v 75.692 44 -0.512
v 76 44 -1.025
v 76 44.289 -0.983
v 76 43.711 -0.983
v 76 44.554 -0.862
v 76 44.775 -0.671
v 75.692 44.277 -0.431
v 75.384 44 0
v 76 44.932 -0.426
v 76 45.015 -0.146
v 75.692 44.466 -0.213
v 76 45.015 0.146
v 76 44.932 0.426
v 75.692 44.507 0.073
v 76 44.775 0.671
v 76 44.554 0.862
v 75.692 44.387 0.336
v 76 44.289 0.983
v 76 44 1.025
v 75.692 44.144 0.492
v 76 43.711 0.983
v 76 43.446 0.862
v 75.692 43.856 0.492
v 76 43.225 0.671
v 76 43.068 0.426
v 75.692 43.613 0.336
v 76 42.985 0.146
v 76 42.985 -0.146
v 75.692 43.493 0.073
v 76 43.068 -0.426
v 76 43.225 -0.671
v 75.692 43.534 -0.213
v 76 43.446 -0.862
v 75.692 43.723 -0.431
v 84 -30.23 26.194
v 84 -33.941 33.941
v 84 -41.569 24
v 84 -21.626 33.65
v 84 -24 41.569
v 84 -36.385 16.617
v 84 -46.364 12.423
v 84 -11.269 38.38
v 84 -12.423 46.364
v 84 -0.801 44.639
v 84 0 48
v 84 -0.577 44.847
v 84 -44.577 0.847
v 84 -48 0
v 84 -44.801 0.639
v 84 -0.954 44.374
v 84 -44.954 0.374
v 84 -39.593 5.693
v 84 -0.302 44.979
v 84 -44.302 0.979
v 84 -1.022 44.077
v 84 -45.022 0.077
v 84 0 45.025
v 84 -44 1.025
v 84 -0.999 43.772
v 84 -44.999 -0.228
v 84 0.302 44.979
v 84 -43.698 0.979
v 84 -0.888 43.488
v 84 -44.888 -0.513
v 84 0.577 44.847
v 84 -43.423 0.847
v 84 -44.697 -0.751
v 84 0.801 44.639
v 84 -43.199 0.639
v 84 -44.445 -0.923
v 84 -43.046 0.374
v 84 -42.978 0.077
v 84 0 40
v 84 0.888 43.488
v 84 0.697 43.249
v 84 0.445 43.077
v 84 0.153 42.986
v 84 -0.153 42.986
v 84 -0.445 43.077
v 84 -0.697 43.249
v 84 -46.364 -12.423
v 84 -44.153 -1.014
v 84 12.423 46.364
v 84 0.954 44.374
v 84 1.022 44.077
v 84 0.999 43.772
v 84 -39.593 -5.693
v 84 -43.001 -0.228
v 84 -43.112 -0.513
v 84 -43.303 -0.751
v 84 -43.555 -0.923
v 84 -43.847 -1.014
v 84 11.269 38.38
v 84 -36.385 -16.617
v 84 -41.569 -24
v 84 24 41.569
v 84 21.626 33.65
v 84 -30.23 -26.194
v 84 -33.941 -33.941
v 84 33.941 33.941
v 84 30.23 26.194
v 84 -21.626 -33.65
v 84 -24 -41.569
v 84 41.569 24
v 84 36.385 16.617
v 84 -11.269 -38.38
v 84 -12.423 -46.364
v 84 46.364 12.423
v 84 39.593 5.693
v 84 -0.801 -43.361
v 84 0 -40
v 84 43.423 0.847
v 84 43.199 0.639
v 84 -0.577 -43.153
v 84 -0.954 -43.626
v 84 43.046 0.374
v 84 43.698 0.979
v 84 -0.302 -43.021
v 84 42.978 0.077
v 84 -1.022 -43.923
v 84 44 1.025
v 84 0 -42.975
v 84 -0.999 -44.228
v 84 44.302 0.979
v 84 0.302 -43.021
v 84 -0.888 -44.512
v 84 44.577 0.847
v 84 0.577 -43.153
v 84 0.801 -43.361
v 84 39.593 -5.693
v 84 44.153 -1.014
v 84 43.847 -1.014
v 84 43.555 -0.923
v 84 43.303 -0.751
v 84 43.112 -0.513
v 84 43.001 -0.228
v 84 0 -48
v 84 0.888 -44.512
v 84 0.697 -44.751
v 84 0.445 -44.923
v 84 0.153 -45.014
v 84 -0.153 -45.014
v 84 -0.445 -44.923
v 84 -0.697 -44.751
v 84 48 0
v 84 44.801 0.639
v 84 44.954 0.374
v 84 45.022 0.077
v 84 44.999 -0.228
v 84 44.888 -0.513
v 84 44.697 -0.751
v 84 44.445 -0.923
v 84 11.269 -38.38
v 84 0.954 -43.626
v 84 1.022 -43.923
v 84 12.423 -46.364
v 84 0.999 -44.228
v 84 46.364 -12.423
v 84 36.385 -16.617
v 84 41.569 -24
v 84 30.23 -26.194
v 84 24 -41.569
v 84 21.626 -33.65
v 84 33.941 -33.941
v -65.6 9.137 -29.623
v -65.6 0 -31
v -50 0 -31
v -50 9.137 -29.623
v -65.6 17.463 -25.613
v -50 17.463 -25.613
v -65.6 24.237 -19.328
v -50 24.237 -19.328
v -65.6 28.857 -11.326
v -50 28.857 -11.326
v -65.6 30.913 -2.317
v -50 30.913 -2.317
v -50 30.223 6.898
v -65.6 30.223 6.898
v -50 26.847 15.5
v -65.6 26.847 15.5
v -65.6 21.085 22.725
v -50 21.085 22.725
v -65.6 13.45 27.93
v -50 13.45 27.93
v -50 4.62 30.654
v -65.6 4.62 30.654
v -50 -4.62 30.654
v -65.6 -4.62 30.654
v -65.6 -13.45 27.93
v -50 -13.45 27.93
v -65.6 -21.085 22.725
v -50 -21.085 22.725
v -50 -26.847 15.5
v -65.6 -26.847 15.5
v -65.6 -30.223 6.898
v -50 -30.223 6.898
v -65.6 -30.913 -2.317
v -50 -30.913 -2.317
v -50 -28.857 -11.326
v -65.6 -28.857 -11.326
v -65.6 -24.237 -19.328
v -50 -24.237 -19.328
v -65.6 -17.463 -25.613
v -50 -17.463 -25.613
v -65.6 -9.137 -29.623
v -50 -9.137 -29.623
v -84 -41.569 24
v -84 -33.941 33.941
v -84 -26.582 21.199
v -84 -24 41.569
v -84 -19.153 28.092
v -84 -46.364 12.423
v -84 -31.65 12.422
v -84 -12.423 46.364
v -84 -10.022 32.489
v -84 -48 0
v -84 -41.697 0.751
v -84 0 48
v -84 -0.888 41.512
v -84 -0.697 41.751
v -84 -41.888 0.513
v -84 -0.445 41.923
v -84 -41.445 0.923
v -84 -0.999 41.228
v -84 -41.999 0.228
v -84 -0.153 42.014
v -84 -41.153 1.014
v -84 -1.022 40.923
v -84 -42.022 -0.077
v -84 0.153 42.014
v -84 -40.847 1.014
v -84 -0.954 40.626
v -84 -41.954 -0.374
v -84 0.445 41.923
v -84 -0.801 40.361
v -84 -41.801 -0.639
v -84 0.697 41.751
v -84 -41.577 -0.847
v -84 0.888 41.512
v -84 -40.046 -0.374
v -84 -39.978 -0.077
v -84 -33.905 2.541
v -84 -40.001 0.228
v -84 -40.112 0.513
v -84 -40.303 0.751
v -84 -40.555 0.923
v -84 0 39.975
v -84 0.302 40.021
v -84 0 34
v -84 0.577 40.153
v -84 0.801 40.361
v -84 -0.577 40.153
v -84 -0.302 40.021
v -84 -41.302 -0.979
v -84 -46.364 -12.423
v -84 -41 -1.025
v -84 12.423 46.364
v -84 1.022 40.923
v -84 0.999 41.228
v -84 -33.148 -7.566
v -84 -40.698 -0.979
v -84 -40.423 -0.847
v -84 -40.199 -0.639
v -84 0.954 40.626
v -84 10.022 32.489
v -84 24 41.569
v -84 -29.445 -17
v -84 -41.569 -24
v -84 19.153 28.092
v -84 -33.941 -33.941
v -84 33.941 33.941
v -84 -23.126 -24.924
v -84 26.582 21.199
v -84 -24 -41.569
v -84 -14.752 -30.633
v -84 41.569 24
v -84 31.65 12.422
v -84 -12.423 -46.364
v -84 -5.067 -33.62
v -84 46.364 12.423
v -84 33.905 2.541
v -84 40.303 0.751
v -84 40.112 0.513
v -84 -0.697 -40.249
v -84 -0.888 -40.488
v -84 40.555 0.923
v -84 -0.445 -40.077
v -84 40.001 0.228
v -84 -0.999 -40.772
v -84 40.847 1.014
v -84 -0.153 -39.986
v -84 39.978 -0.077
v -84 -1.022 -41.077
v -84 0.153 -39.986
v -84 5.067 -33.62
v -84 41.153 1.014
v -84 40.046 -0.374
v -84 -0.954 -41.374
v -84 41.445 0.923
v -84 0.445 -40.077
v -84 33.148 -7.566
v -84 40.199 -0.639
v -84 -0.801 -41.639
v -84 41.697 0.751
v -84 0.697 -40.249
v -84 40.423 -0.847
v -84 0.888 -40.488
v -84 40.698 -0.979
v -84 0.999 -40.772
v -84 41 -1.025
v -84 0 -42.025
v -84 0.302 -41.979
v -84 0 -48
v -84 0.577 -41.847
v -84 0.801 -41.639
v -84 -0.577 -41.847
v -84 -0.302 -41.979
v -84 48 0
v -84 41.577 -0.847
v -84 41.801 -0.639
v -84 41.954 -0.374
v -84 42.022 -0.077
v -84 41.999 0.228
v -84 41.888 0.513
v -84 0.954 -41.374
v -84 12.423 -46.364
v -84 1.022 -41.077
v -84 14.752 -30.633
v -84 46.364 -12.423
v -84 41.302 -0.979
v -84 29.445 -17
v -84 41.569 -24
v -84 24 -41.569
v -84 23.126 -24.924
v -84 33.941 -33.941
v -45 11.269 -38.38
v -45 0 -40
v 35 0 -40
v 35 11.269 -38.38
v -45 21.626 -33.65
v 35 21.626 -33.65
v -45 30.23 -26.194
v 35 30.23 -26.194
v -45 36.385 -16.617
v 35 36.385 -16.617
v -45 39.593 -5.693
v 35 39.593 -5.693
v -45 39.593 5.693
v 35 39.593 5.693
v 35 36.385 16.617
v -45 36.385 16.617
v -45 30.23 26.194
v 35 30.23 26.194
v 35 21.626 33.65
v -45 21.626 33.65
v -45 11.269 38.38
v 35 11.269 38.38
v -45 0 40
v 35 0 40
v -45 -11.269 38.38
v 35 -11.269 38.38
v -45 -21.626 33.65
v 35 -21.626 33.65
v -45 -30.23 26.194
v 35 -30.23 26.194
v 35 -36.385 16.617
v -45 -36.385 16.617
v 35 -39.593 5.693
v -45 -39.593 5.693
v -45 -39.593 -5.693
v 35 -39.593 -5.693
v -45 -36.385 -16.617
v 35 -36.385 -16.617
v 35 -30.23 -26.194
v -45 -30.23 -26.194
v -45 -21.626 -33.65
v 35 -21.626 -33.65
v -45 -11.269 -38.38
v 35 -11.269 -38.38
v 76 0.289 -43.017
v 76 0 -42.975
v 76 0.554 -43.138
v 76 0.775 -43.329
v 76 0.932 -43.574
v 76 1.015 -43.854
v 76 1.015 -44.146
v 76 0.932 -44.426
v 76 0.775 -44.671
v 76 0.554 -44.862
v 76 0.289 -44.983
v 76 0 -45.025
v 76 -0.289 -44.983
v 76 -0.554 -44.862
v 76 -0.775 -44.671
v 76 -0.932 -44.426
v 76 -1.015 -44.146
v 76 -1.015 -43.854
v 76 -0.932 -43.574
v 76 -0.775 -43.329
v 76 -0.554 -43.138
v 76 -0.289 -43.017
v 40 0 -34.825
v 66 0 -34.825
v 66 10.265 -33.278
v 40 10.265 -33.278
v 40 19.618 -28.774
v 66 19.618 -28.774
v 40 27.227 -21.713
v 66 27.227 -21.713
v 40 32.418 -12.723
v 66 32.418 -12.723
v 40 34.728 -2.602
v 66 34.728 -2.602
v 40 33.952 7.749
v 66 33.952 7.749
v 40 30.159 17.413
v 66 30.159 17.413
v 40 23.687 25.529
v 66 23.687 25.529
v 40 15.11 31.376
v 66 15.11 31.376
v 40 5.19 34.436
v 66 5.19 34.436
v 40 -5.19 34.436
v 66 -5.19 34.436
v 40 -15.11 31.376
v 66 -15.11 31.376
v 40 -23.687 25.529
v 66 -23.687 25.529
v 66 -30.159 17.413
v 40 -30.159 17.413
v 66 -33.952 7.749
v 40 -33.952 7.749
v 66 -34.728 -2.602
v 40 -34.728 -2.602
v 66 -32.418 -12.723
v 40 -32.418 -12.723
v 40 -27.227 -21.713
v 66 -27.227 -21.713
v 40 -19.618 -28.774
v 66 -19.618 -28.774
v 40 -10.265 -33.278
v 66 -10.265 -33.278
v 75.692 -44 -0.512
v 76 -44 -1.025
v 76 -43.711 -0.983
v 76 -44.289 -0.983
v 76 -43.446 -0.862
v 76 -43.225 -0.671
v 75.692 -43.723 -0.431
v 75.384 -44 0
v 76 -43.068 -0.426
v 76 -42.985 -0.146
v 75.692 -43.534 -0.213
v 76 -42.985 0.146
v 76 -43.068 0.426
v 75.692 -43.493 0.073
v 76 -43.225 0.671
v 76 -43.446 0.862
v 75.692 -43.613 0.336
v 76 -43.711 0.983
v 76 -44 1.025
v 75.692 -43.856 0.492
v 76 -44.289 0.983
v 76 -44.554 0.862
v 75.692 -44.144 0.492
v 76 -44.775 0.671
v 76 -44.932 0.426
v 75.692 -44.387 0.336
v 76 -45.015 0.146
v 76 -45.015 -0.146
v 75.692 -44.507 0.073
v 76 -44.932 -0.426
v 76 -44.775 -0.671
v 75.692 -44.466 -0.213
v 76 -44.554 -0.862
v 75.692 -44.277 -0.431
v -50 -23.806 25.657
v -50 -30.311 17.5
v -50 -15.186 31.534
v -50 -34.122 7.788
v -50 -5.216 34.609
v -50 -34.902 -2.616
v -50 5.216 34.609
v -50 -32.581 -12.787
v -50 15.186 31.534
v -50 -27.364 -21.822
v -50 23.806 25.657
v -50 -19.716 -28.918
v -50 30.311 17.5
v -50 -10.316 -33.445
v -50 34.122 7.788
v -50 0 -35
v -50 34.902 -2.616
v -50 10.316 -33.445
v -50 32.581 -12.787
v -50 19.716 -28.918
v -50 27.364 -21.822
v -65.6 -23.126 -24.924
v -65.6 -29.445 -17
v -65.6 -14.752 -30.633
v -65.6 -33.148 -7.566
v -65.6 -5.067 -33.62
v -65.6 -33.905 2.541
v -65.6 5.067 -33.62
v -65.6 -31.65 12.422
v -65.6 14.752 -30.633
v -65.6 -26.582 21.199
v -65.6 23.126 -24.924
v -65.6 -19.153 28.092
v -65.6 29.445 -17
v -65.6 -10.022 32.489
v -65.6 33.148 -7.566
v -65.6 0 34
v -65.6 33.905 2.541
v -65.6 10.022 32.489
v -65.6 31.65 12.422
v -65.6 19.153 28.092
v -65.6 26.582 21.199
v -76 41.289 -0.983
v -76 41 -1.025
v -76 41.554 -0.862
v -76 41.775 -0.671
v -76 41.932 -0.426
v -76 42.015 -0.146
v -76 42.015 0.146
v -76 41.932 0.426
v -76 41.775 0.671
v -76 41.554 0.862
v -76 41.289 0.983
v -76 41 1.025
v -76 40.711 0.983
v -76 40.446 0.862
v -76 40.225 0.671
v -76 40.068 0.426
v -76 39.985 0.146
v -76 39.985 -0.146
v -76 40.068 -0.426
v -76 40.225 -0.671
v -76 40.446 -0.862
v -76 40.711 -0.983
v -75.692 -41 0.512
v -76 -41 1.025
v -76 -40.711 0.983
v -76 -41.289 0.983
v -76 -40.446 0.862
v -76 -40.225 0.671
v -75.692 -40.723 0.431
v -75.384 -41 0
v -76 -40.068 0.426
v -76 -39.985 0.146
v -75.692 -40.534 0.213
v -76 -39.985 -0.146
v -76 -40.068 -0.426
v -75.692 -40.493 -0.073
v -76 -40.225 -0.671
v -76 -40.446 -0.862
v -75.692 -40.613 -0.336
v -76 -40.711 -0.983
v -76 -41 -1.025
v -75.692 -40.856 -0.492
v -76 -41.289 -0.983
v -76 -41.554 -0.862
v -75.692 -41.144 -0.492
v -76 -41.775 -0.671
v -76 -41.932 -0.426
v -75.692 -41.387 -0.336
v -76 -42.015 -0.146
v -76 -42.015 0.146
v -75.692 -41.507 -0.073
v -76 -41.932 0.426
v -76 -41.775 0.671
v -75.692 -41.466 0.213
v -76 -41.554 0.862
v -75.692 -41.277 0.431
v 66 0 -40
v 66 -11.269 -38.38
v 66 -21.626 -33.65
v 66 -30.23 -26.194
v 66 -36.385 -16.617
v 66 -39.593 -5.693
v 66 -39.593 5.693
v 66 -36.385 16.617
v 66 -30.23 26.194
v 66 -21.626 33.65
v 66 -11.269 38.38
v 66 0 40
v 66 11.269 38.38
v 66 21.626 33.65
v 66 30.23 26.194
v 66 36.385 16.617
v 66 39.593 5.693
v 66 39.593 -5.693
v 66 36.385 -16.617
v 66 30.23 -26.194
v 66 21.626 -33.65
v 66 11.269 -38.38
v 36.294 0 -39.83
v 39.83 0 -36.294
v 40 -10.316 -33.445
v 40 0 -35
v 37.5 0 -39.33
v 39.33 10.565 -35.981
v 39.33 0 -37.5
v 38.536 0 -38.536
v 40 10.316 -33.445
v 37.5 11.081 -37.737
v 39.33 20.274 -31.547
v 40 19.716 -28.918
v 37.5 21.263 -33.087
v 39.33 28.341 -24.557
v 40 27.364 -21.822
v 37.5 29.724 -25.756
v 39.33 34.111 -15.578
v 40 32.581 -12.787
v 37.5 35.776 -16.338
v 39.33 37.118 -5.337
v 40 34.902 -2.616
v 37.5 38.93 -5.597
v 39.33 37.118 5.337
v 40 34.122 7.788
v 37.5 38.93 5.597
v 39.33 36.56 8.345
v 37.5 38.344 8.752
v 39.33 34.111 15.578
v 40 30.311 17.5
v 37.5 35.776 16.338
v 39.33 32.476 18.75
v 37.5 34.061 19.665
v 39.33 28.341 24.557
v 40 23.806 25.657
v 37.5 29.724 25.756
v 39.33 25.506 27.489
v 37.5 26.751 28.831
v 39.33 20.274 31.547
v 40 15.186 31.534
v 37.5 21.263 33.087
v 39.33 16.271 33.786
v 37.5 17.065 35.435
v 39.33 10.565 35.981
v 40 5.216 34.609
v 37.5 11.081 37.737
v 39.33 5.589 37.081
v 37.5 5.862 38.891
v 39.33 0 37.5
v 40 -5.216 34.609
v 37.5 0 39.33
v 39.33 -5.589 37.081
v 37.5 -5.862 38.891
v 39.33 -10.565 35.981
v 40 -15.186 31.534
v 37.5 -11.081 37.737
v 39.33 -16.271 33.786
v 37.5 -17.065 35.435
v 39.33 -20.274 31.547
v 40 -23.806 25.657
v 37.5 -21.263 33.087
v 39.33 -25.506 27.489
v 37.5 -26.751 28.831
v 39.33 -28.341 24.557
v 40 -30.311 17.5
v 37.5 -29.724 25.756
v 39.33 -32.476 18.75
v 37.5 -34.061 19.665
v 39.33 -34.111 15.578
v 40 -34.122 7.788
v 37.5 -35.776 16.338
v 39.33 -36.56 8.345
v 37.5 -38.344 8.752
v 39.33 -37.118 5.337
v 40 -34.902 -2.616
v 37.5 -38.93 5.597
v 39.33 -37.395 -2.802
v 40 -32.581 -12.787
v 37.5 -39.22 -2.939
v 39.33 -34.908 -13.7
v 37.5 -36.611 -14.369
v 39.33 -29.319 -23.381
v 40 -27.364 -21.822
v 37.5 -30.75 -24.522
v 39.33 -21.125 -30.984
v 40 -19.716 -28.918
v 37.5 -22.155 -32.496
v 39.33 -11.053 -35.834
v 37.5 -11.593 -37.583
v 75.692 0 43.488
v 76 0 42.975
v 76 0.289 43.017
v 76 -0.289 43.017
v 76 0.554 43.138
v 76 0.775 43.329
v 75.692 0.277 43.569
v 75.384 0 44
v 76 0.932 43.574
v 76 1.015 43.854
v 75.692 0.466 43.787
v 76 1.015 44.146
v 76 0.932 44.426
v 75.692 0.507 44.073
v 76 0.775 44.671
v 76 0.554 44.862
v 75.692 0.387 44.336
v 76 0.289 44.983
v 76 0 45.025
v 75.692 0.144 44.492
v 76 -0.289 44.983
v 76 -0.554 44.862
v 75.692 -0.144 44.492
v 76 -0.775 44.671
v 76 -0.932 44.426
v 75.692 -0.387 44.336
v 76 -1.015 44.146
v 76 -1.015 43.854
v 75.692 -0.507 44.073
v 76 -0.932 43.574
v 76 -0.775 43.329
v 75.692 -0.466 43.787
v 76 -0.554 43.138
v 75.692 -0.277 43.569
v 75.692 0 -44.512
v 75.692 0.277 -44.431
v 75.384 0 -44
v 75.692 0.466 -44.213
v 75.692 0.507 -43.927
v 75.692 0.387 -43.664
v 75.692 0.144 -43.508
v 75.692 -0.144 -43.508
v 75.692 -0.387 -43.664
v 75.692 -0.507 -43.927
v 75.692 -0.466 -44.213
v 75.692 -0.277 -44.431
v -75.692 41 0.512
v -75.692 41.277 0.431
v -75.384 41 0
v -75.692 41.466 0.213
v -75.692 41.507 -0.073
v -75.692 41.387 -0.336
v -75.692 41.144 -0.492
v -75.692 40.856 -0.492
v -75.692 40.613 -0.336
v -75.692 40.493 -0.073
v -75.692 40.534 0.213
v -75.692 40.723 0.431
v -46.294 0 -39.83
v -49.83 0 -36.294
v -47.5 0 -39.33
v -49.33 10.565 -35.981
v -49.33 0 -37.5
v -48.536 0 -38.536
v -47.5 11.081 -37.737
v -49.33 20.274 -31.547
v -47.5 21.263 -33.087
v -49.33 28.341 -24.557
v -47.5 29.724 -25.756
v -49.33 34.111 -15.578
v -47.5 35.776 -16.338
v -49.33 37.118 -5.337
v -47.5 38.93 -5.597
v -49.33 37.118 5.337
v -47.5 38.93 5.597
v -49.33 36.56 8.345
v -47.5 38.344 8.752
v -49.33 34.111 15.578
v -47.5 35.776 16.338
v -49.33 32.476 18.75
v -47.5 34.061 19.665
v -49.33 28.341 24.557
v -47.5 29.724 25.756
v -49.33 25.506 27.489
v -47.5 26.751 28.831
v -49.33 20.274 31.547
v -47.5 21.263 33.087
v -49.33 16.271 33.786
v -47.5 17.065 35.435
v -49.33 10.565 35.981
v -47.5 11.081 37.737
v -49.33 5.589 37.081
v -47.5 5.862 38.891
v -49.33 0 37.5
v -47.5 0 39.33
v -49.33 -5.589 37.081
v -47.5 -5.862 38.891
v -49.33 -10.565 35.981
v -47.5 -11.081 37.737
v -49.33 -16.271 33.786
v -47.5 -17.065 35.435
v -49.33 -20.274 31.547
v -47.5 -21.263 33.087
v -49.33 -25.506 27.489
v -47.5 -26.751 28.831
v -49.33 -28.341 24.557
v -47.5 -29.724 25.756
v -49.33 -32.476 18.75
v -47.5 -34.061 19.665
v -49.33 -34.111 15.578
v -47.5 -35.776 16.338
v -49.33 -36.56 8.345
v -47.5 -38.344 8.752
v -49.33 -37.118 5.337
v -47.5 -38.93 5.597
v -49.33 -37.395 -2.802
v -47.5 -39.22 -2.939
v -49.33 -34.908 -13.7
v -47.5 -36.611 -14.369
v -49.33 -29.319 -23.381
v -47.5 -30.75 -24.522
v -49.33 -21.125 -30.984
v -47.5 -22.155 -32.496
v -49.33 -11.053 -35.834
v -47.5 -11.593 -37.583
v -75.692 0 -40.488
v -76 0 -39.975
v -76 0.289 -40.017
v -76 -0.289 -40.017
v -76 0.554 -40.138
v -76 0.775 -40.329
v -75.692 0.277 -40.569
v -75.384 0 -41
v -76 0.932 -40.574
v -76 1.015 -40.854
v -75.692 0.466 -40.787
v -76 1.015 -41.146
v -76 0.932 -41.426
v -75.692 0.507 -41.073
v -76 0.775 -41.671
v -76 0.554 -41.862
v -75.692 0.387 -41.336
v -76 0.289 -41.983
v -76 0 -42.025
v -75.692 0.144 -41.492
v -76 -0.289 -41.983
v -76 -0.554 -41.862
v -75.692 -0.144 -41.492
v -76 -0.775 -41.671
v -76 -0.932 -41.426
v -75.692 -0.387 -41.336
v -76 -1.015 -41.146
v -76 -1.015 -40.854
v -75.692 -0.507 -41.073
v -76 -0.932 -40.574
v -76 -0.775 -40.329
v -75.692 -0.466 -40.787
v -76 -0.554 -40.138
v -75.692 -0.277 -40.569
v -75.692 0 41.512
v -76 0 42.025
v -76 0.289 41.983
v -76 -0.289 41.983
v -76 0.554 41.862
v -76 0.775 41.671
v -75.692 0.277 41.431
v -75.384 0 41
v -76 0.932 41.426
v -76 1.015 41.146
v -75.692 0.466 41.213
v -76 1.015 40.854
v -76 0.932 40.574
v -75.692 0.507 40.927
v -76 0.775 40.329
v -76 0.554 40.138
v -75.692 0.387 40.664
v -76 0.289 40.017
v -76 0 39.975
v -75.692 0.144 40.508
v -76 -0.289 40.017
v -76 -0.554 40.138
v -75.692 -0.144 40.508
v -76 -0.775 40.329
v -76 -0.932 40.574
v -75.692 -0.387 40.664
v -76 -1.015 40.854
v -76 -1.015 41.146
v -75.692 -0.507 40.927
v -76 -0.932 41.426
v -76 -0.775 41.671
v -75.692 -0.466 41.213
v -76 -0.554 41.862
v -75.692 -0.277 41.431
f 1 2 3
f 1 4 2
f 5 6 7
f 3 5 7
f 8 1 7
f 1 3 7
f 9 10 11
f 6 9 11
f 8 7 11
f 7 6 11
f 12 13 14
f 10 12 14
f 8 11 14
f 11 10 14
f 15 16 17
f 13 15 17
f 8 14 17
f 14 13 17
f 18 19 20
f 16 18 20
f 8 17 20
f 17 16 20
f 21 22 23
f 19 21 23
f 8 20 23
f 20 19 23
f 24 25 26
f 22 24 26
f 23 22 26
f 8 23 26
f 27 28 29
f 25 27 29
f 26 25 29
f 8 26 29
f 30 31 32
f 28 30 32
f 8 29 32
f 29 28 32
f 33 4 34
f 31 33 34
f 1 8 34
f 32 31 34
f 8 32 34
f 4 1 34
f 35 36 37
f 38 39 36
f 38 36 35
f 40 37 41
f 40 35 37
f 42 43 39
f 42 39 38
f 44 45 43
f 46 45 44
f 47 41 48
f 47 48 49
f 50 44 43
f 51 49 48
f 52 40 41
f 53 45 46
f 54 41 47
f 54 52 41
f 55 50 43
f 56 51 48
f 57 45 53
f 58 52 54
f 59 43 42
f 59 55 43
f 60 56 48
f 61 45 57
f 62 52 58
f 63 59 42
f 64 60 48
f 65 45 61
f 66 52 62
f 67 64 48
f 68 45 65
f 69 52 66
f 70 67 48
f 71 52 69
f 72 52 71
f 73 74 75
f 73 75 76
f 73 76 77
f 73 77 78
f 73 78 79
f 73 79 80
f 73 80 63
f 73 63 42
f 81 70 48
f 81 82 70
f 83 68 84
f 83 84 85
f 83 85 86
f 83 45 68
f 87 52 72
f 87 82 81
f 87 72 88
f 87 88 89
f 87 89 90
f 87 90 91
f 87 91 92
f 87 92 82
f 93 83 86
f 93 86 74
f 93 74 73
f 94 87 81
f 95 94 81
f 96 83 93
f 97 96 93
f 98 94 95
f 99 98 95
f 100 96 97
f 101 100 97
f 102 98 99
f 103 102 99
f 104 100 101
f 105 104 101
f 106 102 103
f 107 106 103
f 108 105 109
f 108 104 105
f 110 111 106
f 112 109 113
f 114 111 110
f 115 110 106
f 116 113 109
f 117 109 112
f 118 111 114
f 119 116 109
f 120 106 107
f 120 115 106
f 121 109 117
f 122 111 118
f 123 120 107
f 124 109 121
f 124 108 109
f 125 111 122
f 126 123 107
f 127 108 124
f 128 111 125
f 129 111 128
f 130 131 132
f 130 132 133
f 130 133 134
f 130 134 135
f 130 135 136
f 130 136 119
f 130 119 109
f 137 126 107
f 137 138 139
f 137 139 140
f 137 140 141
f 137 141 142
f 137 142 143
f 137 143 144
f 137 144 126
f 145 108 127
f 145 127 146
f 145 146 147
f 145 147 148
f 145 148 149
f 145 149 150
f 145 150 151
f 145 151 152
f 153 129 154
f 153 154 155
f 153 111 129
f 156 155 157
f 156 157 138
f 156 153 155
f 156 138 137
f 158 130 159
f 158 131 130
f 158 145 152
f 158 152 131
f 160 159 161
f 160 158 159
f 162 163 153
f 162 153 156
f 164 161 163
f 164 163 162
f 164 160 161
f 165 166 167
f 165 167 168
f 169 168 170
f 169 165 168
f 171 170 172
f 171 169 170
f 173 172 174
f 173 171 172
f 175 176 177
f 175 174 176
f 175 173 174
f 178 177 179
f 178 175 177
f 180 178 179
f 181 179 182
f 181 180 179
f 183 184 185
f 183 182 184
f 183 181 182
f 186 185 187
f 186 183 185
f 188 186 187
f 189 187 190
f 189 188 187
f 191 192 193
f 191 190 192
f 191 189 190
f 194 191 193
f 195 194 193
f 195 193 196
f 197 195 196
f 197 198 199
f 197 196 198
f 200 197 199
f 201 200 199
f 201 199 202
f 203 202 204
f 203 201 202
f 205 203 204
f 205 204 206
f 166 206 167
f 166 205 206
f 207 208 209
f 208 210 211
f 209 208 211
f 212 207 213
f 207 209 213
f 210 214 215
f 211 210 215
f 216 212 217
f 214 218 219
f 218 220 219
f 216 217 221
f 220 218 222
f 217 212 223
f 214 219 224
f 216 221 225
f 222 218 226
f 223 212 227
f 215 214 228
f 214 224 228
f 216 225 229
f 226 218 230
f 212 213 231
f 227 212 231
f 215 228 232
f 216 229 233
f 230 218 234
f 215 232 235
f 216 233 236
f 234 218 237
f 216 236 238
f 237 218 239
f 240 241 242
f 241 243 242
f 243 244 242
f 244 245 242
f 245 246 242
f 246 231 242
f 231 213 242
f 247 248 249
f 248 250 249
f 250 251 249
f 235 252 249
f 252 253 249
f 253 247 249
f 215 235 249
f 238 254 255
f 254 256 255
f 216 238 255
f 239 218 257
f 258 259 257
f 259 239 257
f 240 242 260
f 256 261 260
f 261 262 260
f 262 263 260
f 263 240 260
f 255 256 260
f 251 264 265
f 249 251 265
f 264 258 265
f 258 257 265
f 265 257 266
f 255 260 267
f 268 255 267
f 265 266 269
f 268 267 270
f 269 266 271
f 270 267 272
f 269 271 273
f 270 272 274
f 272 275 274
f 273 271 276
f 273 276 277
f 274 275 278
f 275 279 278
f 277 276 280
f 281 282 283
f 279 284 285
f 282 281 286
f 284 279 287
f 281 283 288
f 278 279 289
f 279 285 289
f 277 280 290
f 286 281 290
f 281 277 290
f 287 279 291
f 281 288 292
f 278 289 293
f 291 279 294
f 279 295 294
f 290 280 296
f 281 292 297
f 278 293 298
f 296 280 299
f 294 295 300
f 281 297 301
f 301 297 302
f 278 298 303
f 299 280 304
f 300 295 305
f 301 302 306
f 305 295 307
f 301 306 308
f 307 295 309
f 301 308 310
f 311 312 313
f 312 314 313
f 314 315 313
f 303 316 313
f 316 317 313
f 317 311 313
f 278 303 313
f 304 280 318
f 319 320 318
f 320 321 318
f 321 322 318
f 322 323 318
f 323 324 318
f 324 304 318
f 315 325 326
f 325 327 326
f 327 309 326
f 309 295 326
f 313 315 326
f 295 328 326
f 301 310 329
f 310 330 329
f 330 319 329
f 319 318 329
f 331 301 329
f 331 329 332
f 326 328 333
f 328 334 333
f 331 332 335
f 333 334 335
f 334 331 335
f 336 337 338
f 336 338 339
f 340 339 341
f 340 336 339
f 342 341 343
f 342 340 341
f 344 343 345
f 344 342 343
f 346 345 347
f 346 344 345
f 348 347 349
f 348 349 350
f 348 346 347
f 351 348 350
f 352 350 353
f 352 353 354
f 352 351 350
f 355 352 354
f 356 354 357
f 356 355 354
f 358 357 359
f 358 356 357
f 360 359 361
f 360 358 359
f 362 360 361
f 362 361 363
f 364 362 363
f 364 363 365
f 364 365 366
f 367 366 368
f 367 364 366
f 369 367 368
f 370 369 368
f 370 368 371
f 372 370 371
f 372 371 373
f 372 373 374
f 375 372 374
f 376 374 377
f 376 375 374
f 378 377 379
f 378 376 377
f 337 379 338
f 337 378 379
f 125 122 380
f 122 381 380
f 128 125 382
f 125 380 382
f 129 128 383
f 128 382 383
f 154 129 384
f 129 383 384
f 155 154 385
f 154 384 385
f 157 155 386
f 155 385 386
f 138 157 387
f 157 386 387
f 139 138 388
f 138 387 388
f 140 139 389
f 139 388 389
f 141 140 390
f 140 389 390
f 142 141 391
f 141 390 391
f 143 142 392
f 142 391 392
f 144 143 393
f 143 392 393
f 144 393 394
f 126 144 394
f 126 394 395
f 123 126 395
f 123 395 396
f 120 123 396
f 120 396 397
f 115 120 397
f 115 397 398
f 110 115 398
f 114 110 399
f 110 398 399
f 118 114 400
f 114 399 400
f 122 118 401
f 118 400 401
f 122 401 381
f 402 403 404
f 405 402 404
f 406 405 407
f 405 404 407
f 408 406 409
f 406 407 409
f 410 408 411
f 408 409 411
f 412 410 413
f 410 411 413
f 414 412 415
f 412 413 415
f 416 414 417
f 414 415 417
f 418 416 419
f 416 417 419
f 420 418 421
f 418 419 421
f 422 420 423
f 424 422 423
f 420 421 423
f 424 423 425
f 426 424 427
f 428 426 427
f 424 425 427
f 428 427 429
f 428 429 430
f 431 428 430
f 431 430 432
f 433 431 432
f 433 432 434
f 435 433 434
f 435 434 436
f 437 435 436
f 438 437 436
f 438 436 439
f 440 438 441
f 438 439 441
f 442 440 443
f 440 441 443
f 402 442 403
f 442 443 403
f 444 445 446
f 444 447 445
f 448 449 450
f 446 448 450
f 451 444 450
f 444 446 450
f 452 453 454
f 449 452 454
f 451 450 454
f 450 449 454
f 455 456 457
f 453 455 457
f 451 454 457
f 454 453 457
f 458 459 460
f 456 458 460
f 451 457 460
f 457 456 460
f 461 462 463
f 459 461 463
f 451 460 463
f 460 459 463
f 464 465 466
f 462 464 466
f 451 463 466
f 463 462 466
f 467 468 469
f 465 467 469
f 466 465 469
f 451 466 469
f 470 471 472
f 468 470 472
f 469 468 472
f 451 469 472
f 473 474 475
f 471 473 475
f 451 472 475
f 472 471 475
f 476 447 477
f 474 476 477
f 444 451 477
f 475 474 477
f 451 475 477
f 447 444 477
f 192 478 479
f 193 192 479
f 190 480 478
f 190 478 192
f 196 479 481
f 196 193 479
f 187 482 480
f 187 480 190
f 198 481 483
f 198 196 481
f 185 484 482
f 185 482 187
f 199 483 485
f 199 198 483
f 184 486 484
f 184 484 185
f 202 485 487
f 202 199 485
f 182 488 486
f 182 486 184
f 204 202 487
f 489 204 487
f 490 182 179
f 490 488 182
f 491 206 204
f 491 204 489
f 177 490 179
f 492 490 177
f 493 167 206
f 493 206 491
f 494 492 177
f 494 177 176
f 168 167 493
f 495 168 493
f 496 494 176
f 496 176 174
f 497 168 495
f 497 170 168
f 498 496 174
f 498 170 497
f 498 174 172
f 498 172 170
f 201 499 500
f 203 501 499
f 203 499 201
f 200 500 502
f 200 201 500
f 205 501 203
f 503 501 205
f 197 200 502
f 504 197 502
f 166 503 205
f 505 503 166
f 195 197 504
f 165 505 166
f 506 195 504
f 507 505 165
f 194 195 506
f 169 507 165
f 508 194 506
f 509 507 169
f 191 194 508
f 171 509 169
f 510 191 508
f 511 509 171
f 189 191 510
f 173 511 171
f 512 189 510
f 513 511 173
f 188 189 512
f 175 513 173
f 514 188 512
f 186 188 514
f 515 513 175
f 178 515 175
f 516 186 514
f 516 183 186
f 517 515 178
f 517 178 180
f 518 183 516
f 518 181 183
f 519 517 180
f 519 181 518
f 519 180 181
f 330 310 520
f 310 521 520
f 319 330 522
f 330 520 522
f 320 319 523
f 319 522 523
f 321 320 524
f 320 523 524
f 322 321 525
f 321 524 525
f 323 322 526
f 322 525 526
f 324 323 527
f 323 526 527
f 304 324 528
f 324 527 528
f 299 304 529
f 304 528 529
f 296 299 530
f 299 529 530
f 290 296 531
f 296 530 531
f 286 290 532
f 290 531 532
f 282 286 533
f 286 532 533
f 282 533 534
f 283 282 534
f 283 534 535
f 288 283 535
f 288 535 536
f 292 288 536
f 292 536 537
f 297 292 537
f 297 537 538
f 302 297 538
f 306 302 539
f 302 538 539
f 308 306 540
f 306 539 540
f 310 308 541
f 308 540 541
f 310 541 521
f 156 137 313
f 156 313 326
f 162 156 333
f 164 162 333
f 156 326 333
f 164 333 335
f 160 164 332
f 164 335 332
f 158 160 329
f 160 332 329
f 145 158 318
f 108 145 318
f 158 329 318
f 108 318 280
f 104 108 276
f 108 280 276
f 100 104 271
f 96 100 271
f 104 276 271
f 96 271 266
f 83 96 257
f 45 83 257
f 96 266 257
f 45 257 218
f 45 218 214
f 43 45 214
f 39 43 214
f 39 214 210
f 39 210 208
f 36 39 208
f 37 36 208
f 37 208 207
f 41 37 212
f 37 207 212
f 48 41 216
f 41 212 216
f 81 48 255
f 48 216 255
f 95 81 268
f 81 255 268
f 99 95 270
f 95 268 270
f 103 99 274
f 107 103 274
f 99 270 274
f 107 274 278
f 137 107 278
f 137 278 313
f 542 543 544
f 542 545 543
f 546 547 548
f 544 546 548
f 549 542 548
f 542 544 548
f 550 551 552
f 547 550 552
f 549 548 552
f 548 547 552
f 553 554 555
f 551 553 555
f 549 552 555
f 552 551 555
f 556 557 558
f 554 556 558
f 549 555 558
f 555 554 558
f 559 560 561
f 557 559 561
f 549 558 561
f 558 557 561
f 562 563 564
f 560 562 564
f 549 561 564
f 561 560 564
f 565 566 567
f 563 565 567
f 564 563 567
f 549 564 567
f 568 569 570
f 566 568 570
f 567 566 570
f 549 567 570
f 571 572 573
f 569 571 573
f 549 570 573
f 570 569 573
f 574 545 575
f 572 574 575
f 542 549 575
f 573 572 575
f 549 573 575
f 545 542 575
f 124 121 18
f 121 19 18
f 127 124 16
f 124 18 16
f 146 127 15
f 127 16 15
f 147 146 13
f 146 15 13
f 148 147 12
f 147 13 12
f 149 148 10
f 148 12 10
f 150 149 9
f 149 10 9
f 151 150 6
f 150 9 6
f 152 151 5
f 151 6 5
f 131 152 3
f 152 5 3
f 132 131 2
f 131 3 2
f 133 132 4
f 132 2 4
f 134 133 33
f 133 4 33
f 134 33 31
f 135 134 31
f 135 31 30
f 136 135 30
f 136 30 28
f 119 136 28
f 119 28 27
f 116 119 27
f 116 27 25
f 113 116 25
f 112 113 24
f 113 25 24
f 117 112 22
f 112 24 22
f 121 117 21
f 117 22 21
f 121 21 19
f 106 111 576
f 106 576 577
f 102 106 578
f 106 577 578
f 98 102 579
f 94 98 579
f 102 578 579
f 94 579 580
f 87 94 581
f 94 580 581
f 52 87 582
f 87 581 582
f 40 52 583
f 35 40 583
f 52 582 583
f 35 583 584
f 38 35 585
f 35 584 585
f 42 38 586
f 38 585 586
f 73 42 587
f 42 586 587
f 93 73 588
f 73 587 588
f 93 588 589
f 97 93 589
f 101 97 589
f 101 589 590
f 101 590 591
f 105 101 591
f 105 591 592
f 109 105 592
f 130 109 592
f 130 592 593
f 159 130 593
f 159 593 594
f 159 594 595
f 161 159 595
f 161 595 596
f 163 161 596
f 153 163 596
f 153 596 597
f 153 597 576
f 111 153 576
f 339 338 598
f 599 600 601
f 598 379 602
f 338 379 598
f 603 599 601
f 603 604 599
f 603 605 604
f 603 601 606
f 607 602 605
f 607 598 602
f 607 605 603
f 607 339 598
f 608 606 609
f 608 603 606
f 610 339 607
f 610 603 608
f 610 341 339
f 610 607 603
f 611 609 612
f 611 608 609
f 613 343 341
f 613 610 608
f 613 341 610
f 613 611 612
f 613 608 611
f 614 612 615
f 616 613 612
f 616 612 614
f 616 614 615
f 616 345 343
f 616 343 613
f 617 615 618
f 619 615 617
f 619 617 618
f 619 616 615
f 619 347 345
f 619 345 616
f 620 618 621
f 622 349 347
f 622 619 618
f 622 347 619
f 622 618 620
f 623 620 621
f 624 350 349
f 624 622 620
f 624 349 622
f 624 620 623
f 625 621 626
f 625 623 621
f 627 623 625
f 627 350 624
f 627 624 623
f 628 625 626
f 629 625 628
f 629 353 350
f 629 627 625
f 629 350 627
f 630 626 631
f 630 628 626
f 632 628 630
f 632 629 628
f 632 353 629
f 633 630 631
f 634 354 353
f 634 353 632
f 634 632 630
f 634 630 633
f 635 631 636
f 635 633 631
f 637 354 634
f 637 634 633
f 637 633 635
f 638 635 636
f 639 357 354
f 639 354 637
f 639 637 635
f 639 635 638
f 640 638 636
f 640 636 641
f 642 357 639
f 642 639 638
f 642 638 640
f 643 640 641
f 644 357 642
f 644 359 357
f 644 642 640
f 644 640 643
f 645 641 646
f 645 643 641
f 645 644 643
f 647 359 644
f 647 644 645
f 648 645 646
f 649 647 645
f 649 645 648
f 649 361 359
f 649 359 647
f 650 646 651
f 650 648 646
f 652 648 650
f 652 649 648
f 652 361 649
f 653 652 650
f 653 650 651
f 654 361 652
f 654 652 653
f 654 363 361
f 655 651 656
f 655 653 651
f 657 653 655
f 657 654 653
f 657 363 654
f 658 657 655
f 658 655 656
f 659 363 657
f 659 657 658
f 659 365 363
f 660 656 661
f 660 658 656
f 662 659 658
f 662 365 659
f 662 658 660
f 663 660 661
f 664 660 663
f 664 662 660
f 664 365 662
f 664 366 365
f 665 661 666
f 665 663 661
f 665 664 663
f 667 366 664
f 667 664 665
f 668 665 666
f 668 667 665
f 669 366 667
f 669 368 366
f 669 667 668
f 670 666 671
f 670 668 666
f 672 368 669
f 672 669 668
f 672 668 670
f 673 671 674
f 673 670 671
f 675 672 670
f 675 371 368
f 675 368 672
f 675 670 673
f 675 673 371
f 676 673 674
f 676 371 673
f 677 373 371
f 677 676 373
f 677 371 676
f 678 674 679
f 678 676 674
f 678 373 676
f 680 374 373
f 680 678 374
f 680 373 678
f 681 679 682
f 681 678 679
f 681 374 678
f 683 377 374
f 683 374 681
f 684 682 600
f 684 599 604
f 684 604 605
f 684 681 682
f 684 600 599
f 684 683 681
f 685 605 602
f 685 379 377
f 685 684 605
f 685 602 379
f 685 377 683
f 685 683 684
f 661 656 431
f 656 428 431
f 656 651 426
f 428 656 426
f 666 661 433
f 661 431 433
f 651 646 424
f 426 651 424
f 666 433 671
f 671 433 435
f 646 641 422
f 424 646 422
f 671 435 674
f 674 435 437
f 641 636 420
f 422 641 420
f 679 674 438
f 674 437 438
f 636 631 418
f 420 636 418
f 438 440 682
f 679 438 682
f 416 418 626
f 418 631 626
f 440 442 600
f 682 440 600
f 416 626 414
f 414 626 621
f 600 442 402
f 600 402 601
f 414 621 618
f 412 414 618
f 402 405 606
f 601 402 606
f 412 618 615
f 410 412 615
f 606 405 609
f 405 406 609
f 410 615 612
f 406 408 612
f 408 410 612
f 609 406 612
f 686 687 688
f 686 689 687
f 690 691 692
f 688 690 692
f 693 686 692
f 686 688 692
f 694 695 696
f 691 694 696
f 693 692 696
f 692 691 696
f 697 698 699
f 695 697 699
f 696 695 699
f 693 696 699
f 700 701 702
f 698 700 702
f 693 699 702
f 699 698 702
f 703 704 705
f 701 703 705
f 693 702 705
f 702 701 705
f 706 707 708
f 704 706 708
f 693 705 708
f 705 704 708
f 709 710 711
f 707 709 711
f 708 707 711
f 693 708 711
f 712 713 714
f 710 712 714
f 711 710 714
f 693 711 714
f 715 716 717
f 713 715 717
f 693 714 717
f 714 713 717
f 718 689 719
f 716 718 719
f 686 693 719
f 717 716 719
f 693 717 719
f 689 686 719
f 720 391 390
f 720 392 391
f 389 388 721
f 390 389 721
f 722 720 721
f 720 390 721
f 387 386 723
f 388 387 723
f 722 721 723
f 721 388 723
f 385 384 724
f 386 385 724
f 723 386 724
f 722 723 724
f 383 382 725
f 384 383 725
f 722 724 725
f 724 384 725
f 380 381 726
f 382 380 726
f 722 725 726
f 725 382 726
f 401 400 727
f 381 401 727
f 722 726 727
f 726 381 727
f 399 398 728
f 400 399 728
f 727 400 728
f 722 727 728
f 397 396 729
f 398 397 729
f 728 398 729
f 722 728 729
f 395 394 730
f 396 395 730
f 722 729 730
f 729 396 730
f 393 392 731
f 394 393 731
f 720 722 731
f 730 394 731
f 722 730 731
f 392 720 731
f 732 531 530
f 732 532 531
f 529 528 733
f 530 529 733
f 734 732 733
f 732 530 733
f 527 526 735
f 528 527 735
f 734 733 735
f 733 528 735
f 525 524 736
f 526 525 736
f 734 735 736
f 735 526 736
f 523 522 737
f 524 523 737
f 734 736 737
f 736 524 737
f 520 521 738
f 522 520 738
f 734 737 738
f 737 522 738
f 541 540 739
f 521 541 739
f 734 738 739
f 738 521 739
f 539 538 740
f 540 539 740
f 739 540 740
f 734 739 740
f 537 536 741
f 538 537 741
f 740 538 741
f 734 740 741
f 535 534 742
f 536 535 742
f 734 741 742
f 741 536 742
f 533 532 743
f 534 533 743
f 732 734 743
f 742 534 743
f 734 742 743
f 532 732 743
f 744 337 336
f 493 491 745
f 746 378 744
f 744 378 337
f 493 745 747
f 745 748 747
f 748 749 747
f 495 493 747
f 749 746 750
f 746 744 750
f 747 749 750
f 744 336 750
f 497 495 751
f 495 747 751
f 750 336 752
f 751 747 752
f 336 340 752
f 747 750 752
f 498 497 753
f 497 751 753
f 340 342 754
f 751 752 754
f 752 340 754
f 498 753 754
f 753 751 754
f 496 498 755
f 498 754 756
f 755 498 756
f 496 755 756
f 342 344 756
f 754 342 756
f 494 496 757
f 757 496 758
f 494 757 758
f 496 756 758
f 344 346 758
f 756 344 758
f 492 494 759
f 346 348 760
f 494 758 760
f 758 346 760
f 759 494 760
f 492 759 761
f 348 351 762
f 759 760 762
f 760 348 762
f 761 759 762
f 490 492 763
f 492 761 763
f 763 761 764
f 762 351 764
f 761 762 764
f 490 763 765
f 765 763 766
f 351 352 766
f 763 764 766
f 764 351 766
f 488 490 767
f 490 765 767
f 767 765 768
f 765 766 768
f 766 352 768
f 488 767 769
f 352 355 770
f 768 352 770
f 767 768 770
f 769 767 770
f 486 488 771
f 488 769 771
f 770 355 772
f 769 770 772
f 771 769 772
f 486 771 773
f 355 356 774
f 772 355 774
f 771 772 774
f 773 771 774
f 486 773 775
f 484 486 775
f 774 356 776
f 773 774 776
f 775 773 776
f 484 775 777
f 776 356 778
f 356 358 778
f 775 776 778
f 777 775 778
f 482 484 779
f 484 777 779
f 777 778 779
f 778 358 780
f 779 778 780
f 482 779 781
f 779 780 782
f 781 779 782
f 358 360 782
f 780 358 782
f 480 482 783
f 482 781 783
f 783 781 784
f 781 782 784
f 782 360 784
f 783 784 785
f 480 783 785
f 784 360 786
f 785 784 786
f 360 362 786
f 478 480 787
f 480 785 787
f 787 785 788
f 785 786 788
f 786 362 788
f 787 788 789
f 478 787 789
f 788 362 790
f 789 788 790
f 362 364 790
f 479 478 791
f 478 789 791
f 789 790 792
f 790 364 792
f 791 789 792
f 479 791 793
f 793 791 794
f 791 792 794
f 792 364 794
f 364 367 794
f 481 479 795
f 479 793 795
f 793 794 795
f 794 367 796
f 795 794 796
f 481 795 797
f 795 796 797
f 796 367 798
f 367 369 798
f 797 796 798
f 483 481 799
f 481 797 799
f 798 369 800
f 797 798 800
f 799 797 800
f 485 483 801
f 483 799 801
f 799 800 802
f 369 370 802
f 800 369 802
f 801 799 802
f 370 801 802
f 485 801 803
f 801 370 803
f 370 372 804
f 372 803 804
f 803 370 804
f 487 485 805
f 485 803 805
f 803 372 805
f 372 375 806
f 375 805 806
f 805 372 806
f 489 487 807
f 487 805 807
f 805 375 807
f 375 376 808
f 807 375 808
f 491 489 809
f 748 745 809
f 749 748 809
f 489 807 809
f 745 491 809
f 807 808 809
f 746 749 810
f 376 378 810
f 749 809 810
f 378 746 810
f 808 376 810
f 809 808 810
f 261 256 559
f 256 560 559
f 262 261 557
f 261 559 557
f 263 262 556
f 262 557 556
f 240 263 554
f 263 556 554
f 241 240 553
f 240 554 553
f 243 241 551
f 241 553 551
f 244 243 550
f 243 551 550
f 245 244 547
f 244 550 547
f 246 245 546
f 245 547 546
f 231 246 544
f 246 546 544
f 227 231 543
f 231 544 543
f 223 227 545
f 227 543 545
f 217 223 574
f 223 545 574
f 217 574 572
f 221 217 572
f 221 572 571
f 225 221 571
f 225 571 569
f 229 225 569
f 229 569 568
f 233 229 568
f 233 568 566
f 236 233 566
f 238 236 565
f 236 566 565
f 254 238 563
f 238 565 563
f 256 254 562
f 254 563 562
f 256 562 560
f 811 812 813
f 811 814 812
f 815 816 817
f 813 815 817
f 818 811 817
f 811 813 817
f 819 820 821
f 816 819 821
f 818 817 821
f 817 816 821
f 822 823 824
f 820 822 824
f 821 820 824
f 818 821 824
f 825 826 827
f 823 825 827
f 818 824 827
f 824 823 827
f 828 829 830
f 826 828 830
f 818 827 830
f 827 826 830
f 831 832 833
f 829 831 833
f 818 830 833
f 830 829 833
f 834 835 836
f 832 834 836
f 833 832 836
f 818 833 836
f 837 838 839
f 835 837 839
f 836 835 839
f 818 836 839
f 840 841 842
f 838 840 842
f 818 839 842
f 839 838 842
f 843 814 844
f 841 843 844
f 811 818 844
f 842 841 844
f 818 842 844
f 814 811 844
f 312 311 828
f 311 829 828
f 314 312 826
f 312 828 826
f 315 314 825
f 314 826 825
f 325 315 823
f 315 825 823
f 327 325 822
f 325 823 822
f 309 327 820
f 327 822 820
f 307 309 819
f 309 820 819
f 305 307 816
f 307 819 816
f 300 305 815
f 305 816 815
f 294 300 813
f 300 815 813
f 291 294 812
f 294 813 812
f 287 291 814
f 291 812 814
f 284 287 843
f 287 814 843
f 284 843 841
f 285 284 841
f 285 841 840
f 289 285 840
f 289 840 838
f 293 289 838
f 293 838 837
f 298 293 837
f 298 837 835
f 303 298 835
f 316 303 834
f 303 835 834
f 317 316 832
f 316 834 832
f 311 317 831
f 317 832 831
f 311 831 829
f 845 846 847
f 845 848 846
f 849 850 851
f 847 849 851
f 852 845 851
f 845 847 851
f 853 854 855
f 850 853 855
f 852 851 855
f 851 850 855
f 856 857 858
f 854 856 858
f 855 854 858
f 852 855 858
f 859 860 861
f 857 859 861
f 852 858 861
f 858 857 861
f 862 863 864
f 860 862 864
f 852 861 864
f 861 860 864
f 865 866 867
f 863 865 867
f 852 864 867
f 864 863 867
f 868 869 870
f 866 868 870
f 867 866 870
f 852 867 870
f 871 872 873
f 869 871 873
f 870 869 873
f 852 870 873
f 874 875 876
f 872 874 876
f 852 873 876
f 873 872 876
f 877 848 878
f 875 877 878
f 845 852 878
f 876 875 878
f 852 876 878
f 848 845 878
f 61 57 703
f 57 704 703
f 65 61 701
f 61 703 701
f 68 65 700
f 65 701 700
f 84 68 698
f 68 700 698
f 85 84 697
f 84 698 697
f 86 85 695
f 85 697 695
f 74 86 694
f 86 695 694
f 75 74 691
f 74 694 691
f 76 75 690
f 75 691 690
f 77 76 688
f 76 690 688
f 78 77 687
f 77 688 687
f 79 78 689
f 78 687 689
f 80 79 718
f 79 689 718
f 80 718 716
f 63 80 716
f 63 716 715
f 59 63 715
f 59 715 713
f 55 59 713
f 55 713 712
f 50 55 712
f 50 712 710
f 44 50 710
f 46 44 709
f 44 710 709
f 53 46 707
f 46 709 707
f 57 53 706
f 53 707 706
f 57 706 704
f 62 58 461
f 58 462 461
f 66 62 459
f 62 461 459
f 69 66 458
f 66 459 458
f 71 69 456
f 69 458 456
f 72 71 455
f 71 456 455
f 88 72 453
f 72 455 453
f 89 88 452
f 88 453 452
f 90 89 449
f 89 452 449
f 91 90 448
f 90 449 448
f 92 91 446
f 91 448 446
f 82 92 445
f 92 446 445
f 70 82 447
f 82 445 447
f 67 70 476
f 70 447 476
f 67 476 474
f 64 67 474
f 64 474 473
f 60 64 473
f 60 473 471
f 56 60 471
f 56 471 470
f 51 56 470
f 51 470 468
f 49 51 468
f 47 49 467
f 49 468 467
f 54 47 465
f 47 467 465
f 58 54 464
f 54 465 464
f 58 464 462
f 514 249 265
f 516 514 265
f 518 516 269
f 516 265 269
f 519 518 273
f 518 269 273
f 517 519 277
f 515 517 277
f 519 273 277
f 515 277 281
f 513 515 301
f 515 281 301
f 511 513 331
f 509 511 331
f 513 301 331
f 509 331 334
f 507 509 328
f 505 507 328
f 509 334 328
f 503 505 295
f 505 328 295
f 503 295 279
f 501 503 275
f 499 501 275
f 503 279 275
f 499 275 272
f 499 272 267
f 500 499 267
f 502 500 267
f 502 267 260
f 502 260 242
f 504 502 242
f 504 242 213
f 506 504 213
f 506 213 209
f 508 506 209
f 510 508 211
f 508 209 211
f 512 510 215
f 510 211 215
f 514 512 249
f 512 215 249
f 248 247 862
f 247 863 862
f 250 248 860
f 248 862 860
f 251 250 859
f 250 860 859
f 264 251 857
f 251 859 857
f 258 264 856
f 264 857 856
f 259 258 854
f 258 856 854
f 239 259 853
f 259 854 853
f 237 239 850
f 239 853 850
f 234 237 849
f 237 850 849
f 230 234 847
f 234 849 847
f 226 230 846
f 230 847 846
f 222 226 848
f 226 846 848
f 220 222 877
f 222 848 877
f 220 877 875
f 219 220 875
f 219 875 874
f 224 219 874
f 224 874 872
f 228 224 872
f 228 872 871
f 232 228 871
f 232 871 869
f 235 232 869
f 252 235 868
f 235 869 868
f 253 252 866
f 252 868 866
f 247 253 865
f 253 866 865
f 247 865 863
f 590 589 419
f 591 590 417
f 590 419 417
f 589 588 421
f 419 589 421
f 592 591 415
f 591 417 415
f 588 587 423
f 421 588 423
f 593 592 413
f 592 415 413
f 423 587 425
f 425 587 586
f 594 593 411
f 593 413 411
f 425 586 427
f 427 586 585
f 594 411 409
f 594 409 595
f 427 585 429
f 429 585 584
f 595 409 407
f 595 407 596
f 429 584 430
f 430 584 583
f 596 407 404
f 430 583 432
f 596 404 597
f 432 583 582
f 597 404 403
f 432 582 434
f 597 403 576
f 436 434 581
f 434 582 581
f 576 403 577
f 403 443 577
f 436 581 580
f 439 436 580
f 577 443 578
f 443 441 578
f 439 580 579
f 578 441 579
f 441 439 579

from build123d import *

# Parameters (mm, degrees)
BOSS_EXTRUDE1_DEPTH          = 84
BOSS_EXTRUDE1_DEPTH_BACK     = 84
SKETCH2_R                    = 48
CUT_EXTRUDE1_DEPTH           = 40
CUT_EXTRUDE1_DEPTH_BACK      = 50
SKETCH3_R                    = 40
CUT_EXTRUDE2_DEPTH           = 109
CUT_EXTRUDE2_DEPTH_BACK      = 109
SKETCH4_R                    = 31
FILLET1_R                    = 5
CUT_EXTRUDE3_REACH           = 176
CUT_EXTRUDE3_START           = -66
SKETCH5_R                    = 40
SKETCH6_R                    = 34
CUT_EXTRUDE4_DEPTH           = 18.4
M2_5X0_45_TAPPED_HOLE1_D     = 2.05
M2_5X0_45_TAPPED_HOLE1_DEPTH = 8
M2_5X0_45_TAPPED_HOLE1_TIP   = 0.615882135
M2_5X0_45_TAPPED_HOLE2_D     = 2.05
M2_5X0_45_TAPPED_HOLE2_DEPTH = 8
M2_5X0_45_TAPPED_HOLE2_TIP   = 0.615882135
CUT_EXTRUDE6_START           = -18
SKETCH14_R                   = 34.825
CUT_EXTRUDE6_DEPTH           = 26


with BuildPart() as part:
    # Sketch2 → Boss-Extrude1 (new, two sides: drawn at the far end of the back side and taken through both)
    with BuildSketch(Plane(origin=(0, 0, 0), x_dir=(0, -1, 0), z_dir=(1, 0, 0)).offset(-BOSS_EXTRUDE1_DEPTH_BACK)):
        with Locations(Location((0, 0, 0), (0, 0, 90))):
            Circle(SKETCH2_R)
    extrude(amount=BOSS_EXTRUDE1_DEPTH + BOSS_EXTRUDE1_DEPTH_BACK)

    # Sketch3 → Cut-Extrude1 (cut, two sides: drawn at the far end of the back side and taken through both)
    with BuildSketch(Plane(origin=(0, 0, 0), x_dir=(0, -1, 0), z_dir=(1, 0, 0)).offset(-CUT_EXTRUDE1_DEPTH_BACK)):
        with Locations(Location((0, 0, 0), (0, 0, 90))):
            Circle(SKETCH3_R)
    extrude(amount=CUT_EXTRUDE1_DEPTH + CUT_EXTRUDE1_DEPTH_BACK, mode=Mode.SUBTRACT)

    # Sketch4 → Cut-Extrude2 (cut, two sides: drawn at the far end of the back side and taken through both)
    with BuildSketch(Plane(origin=(0, 0, 0), x_dir=(0, -1, 0), z_dir=(1, 0, 0)).offset(-CUT_EXTRUDE2_DEPTH_BACK)):
        with Locations(Location((0, 0, 0), (0, 0, 90))):
            Circle(SKETCH4_R)
    extrude(amount=CUT_EXTRUDE2_DEPTH + CUT_EXTRUDE2_DEPTH_BACK, mode=Mode.SUBTRACT)

    # Fillet1
    fillet1_edges = [part.edges().sort_by_distance(p)[0] for p in [
        (40, 0, 40),
        (-50, 0, 40),
    ]]
    fillet(fillet1_edges, radius=FILLET1_R)

    # Sketch5 → Cut-Extrude3 (cut, up to next)
    with BuildSketch(Plane(origin=(0, 0, 0), x_dir=(0, 0, -1), z_dir=(-1, 0, 0)).offset(CUT_EXTRUDE3_START), mode=Mode.PRIVATE) as cut_extrude3_sk1:
        Circle(SKETCH5_R)
    cut_extrude3_tool1 = extrude(cut_extrude3_sk1.sketch, amount=-CUT_EXTRUDE3_REACH, mode=Mode.PRIVATE) & part.part
    add(cut_extrude3_tool1.solids().sort_by_distance((66, 0, 0))[0], mode=Mode.SUBTRACT)

    # Sketch6 → Cut-Extrude4 (cut)
    with BuildSketch(Plane.ZY.offset(84)):
        Circle(SKETCH6_R)
    extrude(amount=-CUT_EXTRUDE4_DEPTH, mode=Mode.SUBTRACT)

    # M2.5x0.45 Tapped Hole1
    with Locations(Plane(origin=(84, 0, 0), x_dir=(0, 0, -1), z_dir=(1, 0, 0))):
        with Locations((256.353874164, 80.103153953), (0, -44), (-44, 0), (0, 44), (44, 0)):
            Hole(M2_5X0_45_TAPPED_HOLE1_D / 2, depth=M2_5X0_45_TAPPED_HOLE1_DEPTH)
            with Locations((0, 0, -(M2_5X0_45_TAPPED_HOLE1_DEPTH + M2_5X0_45_TAPPED_HOLE1_TIP / 2))):  # 118° drill point
                Cone(0, M2_5X0_45_TAPPED_HOLE1_D / 2, M2_5X0_45_TAPPED_HOLE1_TIP, mode=Mode.SUBTRACT)

    # M2.5x0.45 Tapped Hole2
    with Locations(Plane.ZY.offset(84)):
        with Locations((0, 41), (0, -41), (41, 0), (-41, 0)):
            Hole(M2_5X0_45_TAPPED_HOLE2_D / 2, depth=M2_5X0_45_TAPPED_HOLE2_DEPTH)
            with Locations((0, 0, -(M2_5X0_45_TAPPED_HOLE2_DEPTH + M2_5X0_45_TAPPED_HOLE2_TIP / 2))):  # 118° drill point
                Cone(0, M2_5X0_45_TAPPED_HOLE2_D / 2, M2_5X0_45_TAPPED_HOLE2_TIP, mode=Mode.SUBTRACT)

    # Sketch14 → Cut-Extrude6 (cut)
    with BuildSketch(Plane(origin=(84, 0, 0), x_dir=(0, 0, -1), z_dir=(1, 0, 0)).offset(CUT_EXTRUDE6_START)):
        Circle(SKETCH14_R)
    extrude(amount=-CUT_EXTRUDE6_DEPTH, mode=Mode.SUBTRACT)


solid = part.part
